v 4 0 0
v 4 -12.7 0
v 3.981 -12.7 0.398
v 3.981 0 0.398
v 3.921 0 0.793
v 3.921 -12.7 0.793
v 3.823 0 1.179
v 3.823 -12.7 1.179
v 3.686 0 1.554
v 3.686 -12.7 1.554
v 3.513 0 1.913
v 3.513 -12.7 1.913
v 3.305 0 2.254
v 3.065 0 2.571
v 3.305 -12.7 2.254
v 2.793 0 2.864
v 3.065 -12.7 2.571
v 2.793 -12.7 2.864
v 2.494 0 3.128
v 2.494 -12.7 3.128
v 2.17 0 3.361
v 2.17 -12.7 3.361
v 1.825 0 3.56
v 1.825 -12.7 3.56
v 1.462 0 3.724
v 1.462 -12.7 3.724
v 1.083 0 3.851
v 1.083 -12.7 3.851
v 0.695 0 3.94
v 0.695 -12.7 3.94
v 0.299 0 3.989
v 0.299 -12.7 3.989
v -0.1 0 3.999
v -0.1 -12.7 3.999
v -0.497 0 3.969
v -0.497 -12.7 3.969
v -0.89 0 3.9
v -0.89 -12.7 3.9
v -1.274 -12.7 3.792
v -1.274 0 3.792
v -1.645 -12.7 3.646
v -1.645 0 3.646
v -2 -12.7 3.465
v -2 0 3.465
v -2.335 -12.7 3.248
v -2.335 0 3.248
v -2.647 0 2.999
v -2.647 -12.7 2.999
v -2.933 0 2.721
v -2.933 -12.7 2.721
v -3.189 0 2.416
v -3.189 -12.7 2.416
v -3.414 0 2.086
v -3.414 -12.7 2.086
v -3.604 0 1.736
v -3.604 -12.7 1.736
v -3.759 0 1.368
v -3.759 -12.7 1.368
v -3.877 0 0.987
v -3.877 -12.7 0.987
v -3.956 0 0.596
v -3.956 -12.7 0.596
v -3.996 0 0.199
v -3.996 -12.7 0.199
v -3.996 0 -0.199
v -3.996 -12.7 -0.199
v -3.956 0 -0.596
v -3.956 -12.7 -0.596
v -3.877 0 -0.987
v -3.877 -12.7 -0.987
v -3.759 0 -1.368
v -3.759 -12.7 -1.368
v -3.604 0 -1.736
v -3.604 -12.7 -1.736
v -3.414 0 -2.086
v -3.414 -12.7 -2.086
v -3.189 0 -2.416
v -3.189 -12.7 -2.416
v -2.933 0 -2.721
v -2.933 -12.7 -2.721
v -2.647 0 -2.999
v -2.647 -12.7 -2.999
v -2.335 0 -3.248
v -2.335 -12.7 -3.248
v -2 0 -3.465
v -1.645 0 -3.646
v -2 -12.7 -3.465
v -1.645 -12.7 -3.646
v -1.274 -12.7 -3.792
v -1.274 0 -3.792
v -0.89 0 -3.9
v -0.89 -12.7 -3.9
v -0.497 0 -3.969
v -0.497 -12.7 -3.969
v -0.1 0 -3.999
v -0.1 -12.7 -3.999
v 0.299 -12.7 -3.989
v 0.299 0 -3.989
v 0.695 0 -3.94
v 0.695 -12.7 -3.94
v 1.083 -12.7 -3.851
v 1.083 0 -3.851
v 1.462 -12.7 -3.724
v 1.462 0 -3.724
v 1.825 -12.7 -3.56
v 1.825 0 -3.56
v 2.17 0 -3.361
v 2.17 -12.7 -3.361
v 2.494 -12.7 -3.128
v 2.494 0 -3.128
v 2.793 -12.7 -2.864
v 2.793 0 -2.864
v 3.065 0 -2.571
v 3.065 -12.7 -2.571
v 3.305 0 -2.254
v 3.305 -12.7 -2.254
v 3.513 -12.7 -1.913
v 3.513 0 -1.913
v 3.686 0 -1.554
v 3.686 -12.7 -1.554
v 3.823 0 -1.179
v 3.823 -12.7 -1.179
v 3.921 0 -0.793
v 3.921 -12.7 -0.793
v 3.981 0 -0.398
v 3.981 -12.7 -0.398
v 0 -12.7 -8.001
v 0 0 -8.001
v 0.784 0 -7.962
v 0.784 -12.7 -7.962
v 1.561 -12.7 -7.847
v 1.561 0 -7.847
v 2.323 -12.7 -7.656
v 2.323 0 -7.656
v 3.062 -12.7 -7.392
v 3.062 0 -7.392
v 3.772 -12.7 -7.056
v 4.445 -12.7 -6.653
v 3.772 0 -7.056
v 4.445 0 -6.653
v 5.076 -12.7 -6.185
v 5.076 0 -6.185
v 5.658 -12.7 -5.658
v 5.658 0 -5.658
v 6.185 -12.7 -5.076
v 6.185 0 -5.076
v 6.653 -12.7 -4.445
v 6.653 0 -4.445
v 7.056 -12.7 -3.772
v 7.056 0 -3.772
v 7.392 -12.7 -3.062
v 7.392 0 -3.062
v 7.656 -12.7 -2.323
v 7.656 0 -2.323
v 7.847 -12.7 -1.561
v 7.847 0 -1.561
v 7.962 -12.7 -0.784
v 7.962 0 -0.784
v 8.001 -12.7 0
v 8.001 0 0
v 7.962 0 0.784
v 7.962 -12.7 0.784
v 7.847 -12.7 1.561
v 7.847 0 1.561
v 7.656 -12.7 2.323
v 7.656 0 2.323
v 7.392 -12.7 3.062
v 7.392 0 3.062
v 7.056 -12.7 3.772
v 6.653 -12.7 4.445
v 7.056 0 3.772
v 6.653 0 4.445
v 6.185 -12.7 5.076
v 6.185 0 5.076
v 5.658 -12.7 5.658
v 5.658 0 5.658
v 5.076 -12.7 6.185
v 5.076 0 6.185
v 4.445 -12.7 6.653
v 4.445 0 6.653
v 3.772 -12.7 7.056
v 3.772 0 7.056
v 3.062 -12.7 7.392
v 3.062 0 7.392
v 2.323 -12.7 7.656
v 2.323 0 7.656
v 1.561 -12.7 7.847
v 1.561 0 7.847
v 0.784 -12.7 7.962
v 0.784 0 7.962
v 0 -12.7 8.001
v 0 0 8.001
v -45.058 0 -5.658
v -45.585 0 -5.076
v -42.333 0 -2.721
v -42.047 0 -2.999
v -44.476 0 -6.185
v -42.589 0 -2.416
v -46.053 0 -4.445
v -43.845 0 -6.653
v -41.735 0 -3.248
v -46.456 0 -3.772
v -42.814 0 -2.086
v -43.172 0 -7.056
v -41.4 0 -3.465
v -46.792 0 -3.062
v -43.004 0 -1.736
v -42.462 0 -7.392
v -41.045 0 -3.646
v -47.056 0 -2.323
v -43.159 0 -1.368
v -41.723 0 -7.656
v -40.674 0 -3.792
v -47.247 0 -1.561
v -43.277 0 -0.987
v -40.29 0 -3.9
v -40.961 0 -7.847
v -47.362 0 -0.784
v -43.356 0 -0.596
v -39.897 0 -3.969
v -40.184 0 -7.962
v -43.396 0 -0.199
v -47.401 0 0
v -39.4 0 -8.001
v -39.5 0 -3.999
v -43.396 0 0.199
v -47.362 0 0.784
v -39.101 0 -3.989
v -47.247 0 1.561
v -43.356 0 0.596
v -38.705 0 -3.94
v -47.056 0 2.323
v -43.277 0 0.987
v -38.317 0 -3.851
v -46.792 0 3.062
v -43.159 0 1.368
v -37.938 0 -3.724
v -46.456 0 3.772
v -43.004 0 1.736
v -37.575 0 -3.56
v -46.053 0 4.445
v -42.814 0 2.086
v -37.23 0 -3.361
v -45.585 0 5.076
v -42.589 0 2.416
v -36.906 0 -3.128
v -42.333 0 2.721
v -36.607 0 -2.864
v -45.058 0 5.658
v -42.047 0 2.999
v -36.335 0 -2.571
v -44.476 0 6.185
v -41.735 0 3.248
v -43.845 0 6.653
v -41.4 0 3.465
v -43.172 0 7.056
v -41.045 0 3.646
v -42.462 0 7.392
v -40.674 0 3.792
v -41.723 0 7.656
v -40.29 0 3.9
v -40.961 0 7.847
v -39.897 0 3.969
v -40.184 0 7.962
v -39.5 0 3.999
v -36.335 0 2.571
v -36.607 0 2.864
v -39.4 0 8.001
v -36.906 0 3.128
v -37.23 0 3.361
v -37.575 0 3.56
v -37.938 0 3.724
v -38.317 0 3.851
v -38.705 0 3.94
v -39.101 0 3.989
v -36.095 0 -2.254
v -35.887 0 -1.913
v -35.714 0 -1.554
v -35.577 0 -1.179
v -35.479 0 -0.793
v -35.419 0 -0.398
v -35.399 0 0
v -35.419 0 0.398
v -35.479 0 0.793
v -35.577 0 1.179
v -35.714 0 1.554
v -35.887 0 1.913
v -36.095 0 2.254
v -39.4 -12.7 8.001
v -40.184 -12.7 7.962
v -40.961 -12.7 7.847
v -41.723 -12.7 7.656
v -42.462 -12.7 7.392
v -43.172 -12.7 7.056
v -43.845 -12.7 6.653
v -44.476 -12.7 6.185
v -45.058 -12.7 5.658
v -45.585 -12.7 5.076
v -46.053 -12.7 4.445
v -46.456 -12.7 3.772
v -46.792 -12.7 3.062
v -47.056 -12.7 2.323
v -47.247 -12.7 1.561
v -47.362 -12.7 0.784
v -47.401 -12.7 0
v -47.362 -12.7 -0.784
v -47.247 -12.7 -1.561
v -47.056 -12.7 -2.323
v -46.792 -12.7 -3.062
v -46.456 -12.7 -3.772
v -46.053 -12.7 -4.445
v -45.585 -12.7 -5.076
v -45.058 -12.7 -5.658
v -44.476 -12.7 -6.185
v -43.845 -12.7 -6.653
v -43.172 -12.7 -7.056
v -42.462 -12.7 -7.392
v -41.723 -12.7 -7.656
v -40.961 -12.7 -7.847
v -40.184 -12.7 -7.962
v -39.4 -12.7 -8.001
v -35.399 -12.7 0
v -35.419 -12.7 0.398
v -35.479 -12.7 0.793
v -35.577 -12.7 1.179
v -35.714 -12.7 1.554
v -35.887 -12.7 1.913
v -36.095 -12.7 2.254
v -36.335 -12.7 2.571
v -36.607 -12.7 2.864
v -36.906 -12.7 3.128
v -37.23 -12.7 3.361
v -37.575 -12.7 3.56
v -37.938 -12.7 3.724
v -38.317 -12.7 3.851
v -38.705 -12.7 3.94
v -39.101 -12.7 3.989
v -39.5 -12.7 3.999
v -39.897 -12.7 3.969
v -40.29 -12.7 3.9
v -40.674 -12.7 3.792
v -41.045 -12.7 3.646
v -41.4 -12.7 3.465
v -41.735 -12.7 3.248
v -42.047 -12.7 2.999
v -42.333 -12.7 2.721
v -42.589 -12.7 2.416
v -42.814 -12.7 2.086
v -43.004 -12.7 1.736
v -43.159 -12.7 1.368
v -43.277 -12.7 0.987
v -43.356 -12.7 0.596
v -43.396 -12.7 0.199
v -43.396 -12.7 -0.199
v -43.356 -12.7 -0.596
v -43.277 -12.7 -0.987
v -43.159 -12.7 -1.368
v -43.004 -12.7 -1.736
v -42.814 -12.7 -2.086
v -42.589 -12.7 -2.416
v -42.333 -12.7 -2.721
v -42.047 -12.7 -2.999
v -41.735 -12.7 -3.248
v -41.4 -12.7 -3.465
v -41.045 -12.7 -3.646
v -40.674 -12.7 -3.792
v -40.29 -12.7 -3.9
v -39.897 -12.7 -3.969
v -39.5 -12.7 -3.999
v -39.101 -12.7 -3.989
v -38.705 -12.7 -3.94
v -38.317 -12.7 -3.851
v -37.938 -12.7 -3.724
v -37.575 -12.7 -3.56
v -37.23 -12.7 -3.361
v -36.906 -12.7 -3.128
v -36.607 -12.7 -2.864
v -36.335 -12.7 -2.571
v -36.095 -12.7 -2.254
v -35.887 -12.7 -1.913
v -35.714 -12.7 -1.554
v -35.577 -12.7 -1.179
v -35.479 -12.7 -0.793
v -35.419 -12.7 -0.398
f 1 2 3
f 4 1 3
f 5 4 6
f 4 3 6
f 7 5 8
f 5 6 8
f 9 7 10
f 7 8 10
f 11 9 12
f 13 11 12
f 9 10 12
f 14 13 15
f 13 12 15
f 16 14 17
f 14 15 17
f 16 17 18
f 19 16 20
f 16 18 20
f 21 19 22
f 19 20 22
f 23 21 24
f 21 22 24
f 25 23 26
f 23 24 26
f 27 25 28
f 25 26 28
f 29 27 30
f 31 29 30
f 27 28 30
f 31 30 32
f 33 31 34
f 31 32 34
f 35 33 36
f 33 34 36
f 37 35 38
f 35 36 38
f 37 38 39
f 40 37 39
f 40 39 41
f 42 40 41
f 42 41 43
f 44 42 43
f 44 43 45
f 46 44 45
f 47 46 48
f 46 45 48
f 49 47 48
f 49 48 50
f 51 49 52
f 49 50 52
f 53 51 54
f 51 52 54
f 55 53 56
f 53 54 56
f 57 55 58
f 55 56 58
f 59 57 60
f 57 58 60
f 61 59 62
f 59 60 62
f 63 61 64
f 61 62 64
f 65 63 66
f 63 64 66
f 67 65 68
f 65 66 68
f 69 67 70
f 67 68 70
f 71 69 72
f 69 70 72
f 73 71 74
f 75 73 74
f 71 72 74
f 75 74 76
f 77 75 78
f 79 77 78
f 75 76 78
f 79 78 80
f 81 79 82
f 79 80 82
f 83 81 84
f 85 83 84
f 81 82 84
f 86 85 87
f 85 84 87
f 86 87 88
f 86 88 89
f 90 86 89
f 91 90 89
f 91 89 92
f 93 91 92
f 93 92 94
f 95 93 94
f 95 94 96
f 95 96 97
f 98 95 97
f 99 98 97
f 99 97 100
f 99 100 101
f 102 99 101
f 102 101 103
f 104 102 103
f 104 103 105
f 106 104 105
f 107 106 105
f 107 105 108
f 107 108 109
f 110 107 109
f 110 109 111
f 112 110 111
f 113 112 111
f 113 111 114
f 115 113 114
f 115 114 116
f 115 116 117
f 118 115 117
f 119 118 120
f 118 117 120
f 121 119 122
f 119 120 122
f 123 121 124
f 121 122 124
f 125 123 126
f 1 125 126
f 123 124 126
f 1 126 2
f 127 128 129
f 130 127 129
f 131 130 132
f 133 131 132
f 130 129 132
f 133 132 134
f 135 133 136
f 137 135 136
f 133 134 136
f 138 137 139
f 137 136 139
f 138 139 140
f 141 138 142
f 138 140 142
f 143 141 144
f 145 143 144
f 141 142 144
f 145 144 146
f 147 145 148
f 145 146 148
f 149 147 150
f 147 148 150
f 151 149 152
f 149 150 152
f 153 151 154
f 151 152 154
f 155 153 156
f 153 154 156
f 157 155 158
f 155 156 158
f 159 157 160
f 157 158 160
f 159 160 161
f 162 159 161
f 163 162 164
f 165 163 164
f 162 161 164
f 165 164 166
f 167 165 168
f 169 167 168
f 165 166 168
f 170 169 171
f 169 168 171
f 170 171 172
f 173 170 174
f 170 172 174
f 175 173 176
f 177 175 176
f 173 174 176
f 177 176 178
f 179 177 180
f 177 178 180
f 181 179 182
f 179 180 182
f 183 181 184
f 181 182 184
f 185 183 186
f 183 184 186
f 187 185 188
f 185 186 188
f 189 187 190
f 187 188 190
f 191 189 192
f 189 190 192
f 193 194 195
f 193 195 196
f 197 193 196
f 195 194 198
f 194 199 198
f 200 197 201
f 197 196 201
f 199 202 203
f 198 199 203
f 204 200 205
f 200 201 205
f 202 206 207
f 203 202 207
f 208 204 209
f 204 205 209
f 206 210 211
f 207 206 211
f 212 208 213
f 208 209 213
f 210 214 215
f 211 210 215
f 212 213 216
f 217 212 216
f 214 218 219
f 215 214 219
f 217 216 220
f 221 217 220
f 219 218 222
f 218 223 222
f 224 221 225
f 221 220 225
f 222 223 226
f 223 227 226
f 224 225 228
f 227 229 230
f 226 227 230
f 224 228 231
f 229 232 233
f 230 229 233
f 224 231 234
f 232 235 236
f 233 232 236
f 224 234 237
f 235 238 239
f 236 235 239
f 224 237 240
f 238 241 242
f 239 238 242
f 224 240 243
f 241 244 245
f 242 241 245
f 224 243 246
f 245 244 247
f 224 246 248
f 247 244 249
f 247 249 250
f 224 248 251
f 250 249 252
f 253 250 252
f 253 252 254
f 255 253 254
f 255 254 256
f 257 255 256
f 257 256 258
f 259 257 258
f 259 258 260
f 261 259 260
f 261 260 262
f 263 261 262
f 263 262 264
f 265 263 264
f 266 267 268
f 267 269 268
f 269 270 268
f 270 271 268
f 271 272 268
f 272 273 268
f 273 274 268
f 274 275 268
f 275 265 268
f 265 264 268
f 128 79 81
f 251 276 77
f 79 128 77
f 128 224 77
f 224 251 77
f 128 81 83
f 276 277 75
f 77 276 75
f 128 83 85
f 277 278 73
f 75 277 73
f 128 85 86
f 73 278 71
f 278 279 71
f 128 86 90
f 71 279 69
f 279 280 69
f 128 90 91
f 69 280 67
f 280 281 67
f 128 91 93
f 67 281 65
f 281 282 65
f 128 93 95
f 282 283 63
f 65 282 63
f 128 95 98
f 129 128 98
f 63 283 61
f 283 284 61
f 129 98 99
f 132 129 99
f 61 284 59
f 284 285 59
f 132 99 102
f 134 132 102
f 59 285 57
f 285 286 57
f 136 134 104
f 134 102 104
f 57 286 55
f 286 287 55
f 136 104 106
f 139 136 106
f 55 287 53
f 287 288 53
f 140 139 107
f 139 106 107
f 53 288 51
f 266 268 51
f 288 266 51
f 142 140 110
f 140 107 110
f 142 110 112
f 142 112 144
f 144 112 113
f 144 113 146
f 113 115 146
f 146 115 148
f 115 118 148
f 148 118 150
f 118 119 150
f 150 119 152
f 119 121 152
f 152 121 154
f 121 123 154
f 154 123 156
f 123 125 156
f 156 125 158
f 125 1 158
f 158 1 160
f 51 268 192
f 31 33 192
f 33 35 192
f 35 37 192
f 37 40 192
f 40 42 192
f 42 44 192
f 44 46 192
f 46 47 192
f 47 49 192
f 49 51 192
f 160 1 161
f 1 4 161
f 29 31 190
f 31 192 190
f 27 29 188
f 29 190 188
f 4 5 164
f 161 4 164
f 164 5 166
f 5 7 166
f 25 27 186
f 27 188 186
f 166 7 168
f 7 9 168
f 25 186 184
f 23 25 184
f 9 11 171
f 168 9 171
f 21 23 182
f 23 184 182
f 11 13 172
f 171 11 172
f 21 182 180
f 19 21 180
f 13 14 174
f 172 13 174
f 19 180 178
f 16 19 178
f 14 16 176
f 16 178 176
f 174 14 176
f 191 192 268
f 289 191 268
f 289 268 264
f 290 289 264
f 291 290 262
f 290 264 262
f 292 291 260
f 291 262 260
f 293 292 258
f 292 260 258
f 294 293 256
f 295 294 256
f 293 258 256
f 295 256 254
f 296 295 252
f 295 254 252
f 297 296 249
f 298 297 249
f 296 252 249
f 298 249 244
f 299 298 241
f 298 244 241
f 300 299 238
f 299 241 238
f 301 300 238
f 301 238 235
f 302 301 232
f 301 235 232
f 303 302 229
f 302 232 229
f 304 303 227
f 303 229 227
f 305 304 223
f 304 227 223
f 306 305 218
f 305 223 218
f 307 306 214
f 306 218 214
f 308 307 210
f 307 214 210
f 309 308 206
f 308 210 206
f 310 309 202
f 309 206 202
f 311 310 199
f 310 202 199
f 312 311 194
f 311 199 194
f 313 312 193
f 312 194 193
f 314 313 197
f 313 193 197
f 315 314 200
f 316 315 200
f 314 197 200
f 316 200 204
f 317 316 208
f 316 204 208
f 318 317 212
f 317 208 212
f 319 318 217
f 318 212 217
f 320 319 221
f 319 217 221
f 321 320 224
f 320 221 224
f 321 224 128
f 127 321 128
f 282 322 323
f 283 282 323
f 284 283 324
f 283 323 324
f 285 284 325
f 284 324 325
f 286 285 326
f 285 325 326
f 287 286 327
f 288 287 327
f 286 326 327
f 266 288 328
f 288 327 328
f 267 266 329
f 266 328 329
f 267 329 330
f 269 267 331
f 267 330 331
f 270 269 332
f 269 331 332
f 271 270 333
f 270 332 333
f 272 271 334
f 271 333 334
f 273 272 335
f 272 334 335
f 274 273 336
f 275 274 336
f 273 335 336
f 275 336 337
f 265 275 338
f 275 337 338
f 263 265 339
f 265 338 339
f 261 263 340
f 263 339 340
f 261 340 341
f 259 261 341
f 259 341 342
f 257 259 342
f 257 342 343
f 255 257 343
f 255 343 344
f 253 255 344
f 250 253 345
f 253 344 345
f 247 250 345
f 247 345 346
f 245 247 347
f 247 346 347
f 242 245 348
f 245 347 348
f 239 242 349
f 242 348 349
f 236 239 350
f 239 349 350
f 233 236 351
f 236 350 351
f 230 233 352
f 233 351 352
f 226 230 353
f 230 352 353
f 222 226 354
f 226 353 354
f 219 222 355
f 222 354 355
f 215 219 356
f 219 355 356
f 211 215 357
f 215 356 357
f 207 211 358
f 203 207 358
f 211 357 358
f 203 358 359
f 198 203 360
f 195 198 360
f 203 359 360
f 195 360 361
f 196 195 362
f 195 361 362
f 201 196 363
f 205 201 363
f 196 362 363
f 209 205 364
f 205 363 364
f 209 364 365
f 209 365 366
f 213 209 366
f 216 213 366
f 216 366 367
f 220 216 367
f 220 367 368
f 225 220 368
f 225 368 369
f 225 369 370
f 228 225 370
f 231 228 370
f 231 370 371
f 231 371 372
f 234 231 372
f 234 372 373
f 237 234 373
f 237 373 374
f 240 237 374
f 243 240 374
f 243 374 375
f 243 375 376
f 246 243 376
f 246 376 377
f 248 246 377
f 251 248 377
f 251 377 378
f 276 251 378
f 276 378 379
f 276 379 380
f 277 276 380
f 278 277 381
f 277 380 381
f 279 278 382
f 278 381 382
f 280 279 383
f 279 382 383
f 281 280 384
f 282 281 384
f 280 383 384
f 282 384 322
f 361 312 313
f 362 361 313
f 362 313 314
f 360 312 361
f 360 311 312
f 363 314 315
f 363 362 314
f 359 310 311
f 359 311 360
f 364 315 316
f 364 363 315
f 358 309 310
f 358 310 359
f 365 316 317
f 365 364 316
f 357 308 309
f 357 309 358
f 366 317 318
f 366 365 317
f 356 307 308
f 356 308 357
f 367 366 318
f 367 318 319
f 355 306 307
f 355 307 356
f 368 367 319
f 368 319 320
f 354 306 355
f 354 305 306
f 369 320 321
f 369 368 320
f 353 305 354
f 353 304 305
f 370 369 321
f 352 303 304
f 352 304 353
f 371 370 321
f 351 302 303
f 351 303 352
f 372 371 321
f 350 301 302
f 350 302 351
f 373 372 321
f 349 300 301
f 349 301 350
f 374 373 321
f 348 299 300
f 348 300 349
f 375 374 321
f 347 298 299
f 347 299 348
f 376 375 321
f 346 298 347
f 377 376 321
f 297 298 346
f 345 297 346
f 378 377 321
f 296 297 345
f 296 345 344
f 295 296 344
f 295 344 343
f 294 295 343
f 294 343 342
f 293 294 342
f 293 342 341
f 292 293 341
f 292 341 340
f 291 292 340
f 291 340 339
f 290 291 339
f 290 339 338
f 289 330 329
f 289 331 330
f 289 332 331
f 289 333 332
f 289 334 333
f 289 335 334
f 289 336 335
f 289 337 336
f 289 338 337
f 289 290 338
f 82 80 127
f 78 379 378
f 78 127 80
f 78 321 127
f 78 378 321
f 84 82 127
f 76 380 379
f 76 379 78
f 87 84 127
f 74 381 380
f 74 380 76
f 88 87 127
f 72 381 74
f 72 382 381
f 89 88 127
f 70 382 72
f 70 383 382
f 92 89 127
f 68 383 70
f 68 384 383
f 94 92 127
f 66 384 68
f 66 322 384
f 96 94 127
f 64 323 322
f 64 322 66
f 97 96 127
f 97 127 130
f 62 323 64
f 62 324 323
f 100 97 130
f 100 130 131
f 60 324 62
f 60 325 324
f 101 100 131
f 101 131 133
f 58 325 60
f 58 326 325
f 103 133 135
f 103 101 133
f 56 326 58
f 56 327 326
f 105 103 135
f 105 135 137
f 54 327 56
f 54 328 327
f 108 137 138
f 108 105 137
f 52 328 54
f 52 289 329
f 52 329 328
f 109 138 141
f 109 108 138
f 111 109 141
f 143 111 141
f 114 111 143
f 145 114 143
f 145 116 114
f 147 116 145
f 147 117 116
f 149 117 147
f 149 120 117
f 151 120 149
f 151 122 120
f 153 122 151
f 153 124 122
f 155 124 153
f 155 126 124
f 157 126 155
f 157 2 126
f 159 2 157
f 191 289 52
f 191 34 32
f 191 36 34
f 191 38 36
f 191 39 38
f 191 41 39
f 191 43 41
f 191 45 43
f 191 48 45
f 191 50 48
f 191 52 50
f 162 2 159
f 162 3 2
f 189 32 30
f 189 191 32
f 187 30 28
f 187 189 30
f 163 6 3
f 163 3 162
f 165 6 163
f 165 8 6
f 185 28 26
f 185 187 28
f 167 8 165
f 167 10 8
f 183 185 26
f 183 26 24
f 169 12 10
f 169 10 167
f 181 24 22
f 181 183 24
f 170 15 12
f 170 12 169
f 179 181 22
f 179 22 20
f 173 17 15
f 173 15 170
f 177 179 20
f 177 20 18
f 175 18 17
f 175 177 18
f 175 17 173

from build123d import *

# Parameters (mm, degrees)
F1_DEPTH = 12.7
F2_R     = 4.0005
F3_DEPTH = 12.7


with BuildPart() as f1:
    # F0 (on Front) → F1 (new body)
    with BuildSketch(Plane.XZ):
        with BuildLine():
            ThreePointArc((-39.4, -8.001), (-33.742439, -5.657561), (-31.399, 0))
            ThreePointArc((-31.399, 0), (-33.742439, 5.657561), (-39.4, 8.001))
            ThreePointArc((-39.4, 8.001), (-47.401, 0), (-39.4, -8.001))
        make_face()
        with BuildLine():
            ThreePointArc((-39.4, 8.001), (-33.742439, 5.657561), (-31.399, 0))
            ThreePointArc((-31.399, 0), (-33.742439, -5.657561), (-39.4, -8.001))
            Line((-39.4, -8.001), (0, -8.001))
            ThreePointArc((0, -8.001), (-8.001, 0), (0, 8.001))
            Line((0, 8.001), (-39.4, 8.001))
        make_face()
        with BuildLine():
            ThreePointArc((8.001, 0), (5.657561, 5.657561), (0, 8.001))
            ThreePointArc((0, 8.001), (-8.001, 0), (0, -8.001))
            ThreePointArc((0, -8.001), (5.657561, -5.657561), (8.001, 0))
        make_face()
    extrude(amount=F1_DEPTH)

    # F2 (on face) → F3 (cut, through all)
    with BuildSketch(Plane.XZ.offset(12.7)):
        with Locations((-39.4, 0)):
            Circle(F2_R)
        Circle(F2_R)
    extrude(amount=-F3_DEPTH, mode=Mode.SUBTRACT)


solid = f1.part
